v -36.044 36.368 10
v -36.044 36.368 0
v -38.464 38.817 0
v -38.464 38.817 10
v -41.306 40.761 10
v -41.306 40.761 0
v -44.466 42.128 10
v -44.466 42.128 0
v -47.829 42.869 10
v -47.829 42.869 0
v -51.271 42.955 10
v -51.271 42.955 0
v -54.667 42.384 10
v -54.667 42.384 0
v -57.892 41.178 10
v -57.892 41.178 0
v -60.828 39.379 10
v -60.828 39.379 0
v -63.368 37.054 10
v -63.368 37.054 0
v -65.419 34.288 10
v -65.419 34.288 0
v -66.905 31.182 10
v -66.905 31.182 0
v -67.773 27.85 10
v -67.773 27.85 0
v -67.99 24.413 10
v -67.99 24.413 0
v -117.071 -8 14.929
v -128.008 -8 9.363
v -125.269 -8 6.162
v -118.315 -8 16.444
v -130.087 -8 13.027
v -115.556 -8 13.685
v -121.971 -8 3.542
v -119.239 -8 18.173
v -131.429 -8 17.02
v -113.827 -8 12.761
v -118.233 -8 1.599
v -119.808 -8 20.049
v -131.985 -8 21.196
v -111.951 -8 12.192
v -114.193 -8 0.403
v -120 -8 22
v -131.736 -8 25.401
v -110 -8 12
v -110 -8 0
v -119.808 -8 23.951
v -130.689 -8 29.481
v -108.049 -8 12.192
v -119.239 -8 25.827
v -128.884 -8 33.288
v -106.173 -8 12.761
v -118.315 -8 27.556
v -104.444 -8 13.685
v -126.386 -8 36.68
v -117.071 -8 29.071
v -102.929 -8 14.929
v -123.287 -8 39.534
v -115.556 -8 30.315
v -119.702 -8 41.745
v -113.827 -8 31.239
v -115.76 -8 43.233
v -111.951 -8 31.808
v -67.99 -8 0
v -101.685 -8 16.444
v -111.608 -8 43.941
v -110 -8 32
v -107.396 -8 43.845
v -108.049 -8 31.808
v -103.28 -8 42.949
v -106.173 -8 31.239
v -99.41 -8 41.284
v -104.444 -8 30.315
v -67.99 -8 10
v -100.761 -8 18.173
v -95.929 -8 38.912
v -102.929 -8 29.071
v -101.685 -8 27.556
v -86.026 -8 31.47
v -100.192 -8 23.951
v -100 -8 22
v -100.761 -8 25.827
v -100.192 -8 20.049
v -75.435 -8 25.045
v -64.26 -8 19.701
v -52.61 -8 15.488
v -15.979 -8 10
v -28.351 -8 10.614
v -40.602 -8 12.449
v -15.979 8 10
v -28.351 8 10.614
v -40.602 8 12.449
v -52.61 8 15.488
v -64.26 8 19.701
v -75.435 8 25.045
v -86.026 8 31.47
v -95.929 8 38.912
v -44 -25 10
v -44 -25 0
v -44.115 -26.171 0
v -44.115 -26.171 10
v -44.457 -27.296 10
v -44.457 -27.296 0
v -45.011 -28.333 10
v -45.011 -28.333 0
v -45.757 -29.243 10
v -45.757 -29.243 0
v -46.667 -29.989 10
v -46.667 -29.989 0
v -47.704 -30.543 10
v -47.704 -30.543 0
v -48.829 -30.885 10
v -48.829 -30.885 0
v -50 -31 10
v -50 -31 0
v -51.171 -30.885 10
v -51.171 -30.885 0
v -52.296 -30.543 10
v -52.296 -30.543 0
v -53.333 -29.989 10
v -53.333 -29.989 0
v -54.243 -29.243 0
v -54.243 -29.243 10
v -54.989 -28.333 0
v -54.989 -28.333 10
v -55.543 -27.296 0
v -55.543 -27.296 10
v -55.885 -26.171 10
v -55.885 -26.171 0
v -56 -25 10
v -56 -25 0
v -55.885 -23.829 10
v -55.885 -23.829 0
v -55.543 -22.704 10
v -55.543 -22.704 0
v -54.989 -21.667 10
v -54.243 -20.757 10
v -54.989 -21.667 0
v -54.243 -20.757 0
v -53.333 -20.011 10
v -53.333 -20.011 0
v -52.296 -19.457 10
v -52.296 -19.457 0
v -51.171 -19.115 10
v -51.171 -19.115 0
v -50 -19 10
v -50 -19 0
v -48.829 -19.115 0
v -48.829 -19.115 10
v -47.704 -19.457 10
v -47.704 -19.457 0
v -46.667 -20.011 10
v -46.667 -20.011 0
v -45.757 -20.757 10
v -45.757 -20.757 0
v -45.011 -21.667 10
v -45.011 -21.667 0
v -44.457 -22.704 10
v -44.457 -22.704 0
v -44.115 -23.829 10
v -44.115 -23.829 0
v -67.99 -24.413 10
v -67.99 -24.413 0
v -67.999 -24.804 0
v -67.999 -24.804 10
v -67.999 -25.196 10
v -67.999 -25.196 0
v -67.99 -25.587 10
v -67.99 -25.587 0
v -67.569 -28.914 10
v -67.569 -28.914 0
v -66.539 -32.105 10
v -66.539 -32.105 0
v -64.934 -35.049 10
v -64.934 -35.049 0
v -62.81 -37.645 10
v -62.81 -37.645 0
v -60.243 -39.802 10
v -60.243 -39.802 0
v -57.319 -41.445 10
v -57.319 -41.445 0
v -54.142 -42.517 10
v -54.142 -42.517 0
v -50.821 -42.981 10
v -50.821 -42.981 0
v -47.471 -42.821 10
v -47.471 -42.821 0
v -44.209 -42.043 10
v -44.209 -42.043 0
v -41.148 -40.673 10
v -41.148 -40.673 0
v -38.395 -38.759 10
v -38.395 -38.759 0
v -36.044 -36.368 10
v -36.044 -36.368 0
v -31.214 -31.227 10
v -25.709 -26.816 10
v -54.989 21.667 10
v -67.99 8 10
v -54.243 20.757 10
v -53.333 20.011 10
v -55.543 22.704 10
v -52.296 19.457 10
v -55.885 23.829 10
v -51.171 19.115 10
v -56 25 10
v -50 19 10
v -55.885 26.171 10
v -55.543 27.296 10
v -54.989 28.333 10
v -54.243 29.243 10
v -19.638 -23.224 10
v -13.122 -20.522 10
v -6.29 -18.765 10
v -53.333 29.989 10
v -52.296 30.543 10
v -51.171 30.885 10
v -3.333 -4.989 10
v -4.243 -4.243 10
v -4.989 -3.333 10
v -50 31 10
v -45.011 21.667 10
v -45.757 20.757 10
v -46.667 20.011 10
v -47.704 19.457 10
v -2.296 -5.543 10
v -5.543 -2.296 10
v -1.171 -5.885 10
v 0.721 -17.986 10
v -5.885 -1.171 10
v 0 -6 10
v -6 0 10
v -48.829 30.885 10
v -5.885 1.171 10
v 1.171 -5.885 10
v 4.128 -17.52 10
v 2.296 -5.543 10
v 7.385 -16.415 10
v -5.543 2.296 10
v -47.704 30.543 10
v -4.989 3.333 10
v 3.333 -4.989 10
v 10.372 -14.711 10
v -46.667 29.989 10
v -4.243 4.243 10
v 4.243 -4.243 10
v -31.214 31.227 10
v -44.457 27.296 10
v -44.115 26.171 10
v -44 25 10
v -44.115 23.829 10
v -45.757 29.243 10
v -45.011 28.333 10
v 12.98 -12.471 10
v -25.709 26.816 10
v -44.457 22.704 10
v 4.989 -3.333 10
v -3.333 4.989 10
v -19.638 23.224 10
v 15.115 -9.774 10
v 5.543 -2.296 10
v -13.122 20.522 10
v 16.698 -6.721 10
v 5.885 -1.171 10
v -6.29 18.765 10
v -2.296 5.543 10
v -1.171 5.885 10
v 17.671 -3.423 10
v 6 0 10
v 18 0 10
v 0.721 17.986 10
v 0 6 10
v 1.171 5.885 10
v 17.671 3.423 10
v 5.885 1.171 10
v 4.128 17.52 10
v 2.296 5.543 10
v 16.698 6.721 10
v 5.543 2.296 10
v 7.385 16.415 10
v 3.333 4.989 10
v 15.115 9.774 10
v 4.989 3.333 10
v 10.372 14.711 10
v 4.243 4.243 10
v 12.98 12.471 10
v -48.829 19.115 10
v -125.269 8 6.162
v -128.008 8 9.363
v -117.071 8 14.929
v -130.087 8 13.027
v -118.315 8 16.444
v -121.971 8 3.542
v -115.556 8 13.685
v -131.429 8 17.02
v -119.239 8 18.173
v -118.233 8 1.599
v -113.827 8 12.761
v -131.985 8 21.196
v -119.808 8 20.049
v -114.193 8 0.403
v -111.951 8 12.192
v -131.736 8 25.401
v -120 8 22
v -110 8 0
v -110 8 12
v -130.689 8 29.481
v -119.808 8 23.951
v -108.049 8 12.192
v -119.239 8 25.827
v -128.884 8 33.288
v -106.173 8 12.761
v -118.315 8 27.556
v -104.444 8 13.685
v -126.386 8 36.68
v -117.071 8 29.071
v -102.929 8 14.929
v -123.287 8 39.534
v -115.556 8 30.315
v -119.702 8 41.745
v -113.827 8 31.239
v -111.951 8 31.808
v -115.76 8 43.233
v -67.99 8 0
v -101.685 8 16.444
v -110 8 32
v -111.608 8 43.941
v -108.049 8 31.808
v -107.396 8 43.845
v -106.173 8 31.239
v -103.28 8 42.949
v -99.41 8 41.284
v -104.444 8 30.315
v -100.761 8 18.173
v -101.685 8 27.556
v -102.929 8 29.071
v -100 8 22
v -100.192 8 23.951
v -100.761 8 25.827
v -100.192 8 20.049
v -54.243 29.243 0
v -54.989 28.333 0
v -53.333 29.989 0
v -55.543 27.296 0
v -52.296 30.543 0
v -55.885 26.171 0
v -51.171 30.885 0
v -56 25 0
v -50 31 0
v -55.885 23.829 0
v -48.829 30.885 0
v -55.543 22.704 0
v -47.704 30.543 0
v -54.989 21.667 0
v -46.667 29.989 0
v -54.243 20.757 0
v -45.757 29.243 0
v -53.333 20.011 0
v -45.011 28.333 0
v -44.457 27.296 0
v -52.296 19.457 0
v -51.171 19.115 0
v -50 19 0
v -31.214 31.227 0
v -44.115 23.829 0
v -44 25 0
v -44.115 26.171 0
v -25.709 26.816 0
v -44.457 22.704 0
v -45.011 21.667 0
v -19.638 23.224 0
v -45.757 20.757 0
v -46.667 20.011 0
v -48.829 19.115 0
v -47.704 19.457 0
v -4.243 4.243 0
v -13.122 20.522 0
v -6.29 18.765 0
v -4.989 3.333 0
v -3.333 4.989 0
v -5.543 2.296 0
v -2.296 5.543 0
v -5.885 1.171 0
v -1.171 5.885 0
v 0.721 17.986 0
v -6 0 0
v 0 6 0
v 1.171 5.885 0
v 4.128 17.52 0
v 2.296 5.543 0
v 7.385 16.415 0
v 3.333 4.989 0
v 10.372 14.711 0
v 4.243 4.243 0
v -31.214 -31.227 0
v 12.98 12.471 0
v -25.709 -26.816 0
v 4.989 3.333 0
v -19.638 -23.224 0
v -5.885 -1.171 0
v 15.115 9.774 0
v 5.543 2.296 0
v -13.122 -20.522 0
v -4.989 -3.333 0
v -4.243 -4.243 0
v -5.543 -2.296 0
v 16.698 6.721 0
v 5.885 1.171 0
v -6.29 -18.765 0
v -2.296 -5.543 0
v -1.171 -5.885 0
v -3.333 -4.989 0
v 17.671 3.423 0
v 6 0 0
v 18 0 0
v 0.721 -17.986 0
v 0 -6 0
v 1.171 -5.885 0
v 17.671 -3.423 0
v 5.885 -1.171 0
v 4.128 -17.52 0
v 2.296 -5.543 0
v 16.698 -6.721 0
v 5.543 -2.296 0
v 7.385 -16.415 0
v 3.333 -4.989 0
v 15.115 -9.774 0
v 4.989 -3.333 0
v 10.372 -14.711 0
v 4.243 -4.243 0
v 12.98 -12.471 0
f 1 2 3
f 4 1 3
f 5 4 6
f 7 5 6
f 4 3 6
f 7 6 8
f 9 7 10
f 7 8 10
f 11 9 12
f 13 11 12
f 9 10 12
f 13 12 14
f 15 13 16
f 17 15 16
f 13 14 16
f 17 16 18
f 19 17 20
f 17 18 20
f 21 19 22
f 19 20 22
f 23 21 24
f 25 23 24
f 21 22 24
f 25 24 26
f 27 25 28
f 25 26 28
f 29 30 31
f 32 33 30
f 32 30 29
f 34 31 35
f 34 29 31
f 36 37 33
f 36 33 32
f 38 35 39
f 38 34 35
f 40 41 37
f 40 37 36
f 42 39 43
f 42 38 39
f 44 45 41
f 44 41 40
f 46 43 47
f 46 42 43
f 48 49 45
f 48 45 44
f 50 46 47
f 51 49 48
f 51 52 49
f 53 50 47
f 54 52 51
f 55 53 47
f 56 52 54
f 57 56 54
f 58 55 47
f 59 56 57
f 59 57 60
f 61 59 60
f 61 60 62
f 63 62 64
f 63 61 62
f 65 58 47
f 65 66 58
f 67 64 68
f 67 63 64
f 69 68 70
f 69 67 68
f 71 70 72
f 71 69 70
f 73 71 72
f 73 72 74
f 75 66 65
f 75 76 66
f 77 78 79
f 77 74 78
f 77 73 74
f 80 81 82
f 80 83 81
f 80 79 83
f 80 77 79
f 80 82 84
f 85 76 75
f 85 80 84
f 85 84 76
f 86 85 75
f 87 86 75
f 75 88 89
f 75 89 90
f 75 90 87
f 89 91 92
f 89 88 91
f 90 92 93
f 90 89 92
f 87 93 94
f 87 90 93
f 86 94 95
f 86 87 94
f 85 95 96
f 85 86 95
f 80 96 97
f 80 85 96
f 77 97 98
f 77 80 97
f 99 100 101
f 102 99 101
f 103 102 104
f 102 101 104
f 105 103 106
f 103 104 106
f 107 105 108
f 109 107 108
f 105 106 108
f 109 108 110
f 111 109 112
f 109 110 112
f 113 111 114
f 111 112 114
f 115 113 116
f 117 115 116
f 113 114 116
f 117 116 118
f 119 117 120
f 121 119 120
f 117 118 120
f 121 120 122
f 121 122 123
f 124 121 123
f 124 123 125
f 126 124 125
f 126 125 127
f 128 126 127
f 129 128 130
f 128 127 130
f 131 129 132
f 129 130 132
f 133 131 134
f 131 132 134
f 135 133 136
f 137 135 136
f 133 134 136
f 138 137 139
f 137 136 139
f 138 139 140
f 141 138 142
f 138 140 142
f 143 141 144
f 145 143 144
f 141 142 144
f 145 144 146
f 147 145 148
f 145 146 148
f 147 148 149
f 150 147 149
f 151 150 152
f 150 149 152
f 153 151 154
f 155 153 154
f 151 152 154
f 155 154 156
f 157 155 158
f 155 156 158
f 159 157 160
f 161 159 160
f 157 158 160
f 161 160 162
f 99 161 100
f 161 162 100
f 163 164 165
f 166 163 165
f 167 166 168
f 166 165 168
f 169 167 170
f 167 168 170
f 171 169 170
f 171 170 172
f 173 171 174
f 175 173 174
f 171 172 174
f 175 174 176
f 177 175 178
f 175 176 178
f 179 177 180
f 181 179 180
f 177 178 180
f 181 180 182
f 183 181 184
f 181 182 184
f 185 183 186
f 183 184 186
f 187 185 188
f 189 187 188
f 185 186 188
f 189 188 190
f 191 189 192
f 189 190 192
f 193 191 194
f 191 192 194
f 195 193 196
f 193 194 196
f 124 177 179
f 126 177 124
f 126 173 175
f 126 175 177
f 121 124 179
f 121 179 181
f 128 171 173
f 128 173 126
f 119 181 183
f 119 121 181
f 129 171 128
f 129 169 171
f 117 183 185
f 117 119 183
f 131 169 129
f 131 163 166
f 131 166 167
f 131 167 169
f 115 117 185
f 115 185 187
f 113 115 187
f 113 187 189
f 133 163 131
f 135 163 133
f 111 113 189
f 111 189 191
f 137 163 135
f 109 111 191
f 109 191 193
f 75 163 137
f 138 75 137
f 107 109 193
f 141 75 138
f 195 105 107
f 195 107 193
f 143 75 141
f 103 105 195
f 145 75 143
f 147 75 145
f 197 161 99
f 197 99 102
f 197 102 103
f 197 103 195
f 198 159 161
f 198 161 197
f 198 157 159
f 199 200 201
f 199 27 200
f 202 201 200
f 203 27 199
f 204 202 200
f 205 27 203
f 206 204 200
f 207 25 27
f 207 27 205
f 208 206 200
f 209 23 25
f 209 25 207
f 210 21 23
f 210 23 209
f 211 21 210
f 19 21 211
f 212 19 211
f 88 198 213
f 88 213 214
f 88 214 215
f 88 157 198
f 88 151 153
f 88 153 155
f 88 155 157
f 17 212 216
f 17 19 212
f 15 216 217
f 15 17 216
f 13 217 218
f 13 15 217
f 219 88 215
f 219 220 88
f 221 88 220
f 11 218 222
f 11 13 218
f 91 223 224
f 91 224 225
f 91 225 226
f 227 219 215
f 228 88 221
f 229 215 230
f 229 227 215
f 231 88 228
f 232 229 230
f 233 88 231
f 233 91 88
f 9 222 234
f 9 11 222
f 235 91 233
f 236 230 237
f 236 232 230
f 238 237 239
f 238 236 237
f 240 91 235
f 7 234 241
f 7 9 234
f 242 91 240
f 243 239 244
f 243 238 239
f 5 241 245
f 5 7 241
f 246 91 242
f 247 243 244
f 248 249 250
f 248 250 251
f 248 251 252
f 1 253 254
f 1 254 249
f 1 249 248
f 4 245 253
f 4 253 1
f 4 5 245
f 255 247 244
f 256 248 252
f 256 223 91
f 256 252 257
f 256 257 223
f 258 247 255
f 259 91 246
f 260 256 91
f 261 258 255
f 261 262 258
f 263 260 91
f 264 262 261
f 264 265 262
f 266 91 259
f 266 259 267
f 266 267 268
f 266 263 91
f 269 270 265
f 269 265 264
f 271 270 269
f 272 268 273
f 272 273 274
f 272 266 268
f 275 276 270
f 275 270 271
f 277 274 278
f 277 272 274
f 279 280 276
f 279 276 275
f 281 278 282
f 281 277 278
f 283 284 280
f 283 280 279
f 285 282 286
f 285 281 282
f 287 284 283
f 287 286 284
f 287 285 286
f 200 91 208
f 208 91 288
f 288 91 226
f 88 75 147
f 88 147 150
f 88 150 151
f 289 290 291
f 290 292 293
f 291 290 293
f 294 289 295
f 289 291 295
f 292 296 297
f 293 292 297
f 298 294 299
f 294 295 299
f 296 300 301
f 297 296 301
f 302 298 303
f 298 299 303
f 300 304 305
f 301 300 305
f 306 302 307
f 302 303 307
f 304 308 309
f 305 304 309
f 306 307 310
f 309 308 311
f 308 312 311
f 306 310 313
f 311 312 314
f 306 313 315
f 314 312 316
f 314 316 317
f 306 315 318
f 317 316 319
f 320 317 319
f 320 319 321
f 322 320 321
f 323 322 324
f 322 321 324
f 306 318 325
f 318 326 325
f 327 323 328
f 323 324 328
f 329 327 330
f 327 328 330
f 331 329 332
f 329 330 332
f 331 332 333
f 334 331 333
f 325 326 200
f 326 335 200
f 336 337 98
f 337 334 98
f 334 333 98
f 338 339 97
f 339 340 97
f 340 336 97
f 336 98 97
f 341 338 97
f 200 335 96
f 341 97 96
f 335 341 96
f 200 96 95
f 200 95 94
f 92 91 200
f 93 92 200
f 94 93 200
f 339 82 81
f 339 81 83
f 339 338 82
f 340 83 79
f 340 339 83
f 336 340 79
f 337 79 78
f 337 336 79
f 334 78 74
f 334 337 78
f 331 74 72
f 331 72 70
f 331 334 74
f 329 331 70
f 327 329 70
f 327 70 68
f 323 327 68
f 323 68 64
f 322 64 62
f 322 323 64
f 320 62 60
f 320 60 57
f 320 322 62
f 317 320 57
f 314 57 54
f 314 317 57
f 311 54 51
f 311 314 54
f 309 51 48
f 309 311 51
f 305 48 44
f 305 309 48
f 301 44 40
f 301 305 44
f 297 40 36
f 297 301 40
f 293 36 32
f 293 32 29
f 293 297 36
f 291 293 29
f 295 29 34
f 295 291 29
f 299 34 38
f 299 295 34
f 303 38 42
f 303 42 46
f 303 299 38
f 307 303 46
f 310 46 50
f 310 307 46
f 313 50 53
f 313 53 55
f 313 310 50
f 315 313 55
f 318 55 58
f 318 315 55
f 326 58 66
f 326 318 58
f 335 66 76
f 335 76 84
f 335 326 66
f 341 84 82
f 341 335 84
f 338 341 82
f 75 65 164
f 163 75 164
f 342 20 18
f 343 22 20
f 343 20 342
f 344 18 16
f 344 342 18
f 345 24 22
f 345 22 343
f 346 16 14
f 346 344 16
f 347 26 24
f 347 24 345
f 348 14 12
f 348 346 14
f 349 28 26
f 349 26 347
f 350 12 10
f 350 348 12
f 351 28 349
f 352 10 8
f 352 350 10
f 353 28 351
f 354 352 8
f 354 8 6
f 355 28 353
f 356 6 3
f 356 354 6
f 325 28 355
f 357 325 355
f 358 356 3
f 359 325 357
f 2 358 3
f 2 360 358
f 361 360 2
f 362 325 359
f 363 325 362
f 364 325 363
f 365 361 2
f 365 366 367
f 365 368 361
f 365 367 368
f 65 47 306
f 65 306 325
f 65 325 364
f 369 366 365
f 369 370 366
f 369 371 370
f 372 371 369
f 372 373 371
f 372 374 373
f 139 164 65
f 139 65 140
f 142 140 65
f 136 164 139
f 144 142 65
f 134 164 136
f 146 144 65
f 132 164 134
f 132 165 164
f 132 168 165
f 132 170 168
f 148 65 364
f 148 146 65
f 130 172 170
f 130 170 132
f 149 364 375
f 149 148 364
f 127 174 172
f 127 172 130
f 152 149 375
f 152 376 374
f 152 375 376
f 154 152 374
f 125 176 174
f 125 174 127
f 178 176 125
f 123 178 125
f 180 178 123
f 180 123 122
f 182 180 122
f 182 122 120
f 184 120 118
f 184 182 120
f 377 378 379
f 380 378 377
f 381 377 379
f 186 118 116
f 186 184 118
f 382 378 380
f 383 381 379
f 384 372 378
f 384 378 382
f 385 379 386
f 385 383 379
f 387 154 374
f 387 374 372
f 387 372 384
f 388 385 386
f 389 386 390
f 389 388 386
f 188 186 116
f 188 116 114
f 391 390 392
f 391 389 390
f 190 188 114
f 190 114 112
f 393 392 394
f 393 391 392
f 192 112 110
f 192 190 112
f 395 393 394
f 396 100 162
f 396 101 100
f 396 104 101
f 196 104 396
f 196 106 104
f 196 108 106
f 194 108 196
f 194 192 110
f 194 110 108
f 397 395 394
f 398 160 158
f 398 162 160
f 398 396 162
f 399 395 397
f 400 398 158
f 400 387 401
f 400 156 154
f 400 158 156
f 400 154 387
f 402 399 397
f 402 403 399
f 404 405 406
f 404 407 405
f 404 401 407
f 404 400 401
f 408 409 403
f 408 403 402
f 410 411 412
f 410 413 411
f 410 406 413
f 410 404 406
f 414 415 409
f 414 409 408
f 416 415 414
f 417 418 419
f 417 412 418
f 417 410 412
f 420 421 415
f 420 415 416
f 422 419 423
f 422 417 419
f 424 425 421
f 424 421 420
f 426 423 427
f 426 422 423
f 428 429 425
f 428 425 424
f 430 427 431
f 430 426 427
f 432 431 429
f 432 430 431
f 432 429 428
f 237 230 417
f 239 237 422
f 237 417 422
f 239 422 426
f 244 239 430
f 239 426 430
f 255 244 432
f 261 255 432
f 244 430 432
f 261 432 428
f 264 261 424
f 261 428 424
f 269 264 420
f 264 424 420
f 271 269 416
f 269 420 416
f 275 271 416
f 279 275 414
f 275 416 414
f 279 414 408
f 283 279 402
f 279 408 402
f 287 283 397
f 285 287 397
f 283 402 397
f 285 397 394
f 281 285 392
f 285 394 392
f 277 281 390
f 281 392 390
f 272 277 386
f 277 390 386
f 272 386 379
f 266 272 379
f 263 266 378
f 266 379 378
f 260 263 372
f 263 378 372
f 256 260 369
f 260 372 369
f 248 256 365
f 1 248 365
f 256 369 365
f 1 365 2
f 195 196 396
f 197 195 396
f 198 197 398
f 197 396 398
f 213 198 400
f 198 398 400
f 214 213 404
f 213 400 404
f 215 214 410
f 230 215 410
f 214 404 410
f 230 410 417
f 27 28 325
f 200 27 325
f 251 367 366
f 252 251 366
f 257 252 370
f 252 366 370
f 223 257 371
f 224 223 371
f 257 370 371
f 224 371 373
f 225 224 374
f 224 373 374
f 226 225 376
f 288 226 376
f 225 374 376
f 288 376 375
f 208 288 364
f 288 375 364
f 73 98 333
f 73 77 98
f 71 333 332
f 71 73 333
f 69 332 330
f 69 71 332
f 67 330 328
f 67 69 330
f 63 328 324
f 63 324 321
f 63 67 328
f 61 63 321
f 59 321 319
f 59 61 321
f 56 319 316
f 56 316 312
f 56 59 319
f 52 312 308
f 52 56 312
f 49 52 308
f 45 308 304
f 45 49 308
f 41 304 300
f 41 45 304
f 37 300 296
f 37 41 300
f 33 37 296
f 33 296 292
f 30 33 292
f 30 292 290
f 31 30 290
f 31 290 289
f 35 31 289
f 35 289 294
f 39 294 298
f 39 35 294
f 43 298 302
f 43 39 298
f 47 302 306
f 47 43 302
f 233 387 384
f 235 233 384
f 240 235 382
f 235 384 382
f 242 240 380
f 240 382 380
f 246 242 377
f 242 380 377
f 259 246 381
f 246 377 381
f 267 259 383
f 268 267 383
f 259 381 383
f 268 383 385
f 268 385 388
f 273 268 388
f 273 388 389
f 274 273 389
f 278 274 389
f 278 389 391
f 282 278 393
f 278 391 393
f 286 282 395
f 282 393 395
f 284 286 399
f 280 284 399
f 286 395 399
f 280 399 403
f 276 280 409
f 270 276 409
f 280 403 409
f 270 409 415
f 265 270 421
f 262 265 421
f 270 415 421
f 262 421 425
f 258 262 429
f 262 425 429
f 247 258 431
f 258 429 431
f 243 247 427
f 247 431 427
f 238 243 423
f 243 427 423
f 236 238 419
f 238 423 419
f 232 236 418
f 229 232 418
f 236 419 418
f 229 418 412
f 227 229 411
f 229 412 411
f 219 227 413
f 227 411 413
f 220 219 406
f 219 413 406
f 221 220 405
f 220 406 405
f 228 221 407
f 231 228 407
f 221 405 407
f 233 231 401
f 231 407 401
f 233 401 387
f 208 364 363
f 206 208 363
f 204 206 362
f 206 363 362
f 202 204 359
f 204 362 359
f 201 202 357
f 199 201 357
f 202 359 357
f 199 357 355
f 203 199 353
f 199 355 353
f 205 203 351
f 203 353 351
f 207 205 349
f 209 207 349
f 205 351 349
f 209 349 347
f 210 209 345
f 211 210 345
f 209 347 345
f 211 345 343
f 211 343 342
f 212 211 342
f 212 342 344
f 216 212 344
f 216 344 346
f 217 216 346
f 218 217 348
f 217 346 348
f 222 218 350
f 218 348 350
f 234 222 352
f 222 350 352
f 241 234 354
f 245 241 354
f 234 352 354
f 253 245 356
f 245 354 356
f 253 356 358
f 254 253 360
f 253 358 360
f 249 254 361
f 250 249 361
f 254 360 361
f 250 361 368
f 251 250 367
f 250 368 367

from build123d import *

# Parameters (mm, degrees)
F1_DEPTH = 10
F2_R     = 10
F3_DEPTH = 8


with BuildPart() as f1:
    # F0 (on Top) → F1 (new body)
    with BuildSketch(Plane.XY):
        with BuildLine():
            ThreePointArc((6, 0), (0, 6), (-6, 0))
            ThreePointArc((-6, 0), (0, -6), (6, 0))
        make_face()
        with BuildLine():
            ThreePointArc((0.720724, -17.985565), (12.980236, -12.470505), (18, 0))
            ThreePointArc((18, 0), (12.980236, 12.470505), (0.720724, 17.985565))
            ThreePointArc((0.720724, 17.985565), (-12.470505, 12.980236), (-18, 0))
            ThreePointArc((-18, 0), (-12.470505, -12.980236), (0.720724, -17.985565))
        make_face()
        with BuildLine():
            ThreePointArc((6, 0), (0, -6), (-6, 0))
            ThreePointArc((-6, 0), (0, 6), (6, 0))
        make_face(mode=Mode.SUBTRACT)
        with BuildLine():
            ThreePointArc((-18, 0), (-12.470505, 12.980236), (0.720724, 17.985565))
            ThreePointArc((0.720724, 17.985565), (-19.637945, 23.224109), (-36.043982, 36.367918))
            ThreePointArc((-36.043982, 36.367918), (-33.041104, 31.032896), (-32, 25))
            ThreePointArc((-32, 25), (-37.272078, 12.272078), (-50, 7))
            Line((-50, 7), (-50, 0))
            Line((-50, 0), (-18, 0))
        make_face()
        with BuildLine():
            ThreePointArc((-36.043982, -36.367918), (-19.637945, -23.224109), (0.720724, -17.985565))
            ThreePointArc((0.720724, -17.985565), (-12.470505, -12.980236), (-18, 0))
            Line((-18, 0), (-50, 0))
            Line((-50, 0), (-50, -7))
            ThreePointArc((-50, -7), (-37.272078, -12.272078), (-32, -25))
            ThreePointArc((-32, -25), (-33.041104, -31.032896), (-36.043982, -36.367918))
        make_face()
        with BuildLine():
            ThreePointArc((-44, 25), (-54.242641, 29.242641), (-50, 19))
            ThreePointArc((-50, 19), (-45.757359, 20.757359), (-44, 25))
        make_face()
        with BuildLine():
            ThreePointArc((-32, 25), (-33.041104, 31.032896), (-36.043982, 36.367918))
            ThreePointArc((-36.043982, 36.367918), (-56.308566, 41.858292), (-67.990432, 24.413191))
            ThreePointArc((-67.990432, 24.413191), (-62.518735, 12.066273), (-50, 7))
            ThreePointArc((-50, 7), (-37.272078, 12.272078), (-32, 25))
        make_face()
        with BuildLine():
            ThreePointArc((-44, 25), (-45.757359, 20.757359), (-50, 19))
            ThreePointArc((-50, 19), (-54.242641, 29.242641), (-44, 25))
        make_face(mode=Mode.SUBTRACT)
        with BuildLine():
            ThreePointArc((-44, -25), (-45.757359, -20.757359), (-50, -19))
            ThreePointArc((-50, -19), (-54.242641, -29.242641), (-44, -25))
        make_face()
        with BuildLine():
            ThreePointArc((-67.990432, -25.586809), (-55.755624, -42.054993), (-36.043982, -36.367918))
            ThreePointArc((-36.043982, -36.367918), (-33.041104, -31.032896), (-32, -25))
            ThreePointArc((-32, -25), (-37.272078, -12.272078), (-50, -7))
            ThreePointArc((-50, -7), (-62.518735, -12.066273), (-67.990432, -24.413191))
            Line((-67.990432, -24.413191), (-67.990432, -25.586809))
        make_face()
        with BuildLine():
            ThreePointArc((-44, -25), (-54.242641, -29.242641), (-50, -19))
            ThreePointArc((-50, -19), (-45.757359, -20.757359), (-44, -25))
        make_face(mode=Mode.SUBTRACT)
        with BuildLine():
            Line((-50, -7), (-50, 0))
            Line((-50, 0), (-50, 7))
            ThreePointArc((-50, 7), (-62.518735, 12.066273), (-67.990432, 24.413191))
            Line((-67.990432, 24.413191), (-67.990432, -24.413191))
            ThreePointArc((-67.990432, -24.413191), (-62.518735, -12.066273), (-50, -7))
        make_face()
        with BuildLine():
            ThreePointArc((-67.990432, -24.413191), (-68, -25), (-67.990432, -25.586809))
            Line((-67.990432, -25.586809), (-67.990432, -24.413191))
        make_face()
    extrude(amount=F1_DEPTH)

    # F2 (on Front) → F3 (join, symmetric)
    with BuildSketch(Plane.XZ):
        with BuildLine():
            ThreePointArc((-110, 0), (-94.443651, 6.443651), (-88, 22))
            ThreePointArc((-88, 22), (-90.080579, 31.338987), (-95.928789, 38.911565))
            ThreePointArc((-95.928789, 38.911565), (-130.688818, 29.481496), (-110, 0))
        make_face()
        with Locations((-110, 22)):
            Circle(F2_R, mode=Mode.SUBTRACT)
        with BuildLine():
            ThreePointArc((-95.928789, 38.911565), (-90.080579, 31.338987), (-88, 22))
            ThreePointArc((-88, 22), (-94.443651, 6.443651), (-110, 0))
            Line((-110, 0), (-15.978726, 0))
            Line((-15.978726, 0), (-15.978726, 10))
            ThreePointArc((-15.978726, 10), (-58.487228, 17.449895), (-95.928789, 38.911565))
        make_face()
    extrude(amount=F3_DEPTH, both=True)


solid = f1.part
